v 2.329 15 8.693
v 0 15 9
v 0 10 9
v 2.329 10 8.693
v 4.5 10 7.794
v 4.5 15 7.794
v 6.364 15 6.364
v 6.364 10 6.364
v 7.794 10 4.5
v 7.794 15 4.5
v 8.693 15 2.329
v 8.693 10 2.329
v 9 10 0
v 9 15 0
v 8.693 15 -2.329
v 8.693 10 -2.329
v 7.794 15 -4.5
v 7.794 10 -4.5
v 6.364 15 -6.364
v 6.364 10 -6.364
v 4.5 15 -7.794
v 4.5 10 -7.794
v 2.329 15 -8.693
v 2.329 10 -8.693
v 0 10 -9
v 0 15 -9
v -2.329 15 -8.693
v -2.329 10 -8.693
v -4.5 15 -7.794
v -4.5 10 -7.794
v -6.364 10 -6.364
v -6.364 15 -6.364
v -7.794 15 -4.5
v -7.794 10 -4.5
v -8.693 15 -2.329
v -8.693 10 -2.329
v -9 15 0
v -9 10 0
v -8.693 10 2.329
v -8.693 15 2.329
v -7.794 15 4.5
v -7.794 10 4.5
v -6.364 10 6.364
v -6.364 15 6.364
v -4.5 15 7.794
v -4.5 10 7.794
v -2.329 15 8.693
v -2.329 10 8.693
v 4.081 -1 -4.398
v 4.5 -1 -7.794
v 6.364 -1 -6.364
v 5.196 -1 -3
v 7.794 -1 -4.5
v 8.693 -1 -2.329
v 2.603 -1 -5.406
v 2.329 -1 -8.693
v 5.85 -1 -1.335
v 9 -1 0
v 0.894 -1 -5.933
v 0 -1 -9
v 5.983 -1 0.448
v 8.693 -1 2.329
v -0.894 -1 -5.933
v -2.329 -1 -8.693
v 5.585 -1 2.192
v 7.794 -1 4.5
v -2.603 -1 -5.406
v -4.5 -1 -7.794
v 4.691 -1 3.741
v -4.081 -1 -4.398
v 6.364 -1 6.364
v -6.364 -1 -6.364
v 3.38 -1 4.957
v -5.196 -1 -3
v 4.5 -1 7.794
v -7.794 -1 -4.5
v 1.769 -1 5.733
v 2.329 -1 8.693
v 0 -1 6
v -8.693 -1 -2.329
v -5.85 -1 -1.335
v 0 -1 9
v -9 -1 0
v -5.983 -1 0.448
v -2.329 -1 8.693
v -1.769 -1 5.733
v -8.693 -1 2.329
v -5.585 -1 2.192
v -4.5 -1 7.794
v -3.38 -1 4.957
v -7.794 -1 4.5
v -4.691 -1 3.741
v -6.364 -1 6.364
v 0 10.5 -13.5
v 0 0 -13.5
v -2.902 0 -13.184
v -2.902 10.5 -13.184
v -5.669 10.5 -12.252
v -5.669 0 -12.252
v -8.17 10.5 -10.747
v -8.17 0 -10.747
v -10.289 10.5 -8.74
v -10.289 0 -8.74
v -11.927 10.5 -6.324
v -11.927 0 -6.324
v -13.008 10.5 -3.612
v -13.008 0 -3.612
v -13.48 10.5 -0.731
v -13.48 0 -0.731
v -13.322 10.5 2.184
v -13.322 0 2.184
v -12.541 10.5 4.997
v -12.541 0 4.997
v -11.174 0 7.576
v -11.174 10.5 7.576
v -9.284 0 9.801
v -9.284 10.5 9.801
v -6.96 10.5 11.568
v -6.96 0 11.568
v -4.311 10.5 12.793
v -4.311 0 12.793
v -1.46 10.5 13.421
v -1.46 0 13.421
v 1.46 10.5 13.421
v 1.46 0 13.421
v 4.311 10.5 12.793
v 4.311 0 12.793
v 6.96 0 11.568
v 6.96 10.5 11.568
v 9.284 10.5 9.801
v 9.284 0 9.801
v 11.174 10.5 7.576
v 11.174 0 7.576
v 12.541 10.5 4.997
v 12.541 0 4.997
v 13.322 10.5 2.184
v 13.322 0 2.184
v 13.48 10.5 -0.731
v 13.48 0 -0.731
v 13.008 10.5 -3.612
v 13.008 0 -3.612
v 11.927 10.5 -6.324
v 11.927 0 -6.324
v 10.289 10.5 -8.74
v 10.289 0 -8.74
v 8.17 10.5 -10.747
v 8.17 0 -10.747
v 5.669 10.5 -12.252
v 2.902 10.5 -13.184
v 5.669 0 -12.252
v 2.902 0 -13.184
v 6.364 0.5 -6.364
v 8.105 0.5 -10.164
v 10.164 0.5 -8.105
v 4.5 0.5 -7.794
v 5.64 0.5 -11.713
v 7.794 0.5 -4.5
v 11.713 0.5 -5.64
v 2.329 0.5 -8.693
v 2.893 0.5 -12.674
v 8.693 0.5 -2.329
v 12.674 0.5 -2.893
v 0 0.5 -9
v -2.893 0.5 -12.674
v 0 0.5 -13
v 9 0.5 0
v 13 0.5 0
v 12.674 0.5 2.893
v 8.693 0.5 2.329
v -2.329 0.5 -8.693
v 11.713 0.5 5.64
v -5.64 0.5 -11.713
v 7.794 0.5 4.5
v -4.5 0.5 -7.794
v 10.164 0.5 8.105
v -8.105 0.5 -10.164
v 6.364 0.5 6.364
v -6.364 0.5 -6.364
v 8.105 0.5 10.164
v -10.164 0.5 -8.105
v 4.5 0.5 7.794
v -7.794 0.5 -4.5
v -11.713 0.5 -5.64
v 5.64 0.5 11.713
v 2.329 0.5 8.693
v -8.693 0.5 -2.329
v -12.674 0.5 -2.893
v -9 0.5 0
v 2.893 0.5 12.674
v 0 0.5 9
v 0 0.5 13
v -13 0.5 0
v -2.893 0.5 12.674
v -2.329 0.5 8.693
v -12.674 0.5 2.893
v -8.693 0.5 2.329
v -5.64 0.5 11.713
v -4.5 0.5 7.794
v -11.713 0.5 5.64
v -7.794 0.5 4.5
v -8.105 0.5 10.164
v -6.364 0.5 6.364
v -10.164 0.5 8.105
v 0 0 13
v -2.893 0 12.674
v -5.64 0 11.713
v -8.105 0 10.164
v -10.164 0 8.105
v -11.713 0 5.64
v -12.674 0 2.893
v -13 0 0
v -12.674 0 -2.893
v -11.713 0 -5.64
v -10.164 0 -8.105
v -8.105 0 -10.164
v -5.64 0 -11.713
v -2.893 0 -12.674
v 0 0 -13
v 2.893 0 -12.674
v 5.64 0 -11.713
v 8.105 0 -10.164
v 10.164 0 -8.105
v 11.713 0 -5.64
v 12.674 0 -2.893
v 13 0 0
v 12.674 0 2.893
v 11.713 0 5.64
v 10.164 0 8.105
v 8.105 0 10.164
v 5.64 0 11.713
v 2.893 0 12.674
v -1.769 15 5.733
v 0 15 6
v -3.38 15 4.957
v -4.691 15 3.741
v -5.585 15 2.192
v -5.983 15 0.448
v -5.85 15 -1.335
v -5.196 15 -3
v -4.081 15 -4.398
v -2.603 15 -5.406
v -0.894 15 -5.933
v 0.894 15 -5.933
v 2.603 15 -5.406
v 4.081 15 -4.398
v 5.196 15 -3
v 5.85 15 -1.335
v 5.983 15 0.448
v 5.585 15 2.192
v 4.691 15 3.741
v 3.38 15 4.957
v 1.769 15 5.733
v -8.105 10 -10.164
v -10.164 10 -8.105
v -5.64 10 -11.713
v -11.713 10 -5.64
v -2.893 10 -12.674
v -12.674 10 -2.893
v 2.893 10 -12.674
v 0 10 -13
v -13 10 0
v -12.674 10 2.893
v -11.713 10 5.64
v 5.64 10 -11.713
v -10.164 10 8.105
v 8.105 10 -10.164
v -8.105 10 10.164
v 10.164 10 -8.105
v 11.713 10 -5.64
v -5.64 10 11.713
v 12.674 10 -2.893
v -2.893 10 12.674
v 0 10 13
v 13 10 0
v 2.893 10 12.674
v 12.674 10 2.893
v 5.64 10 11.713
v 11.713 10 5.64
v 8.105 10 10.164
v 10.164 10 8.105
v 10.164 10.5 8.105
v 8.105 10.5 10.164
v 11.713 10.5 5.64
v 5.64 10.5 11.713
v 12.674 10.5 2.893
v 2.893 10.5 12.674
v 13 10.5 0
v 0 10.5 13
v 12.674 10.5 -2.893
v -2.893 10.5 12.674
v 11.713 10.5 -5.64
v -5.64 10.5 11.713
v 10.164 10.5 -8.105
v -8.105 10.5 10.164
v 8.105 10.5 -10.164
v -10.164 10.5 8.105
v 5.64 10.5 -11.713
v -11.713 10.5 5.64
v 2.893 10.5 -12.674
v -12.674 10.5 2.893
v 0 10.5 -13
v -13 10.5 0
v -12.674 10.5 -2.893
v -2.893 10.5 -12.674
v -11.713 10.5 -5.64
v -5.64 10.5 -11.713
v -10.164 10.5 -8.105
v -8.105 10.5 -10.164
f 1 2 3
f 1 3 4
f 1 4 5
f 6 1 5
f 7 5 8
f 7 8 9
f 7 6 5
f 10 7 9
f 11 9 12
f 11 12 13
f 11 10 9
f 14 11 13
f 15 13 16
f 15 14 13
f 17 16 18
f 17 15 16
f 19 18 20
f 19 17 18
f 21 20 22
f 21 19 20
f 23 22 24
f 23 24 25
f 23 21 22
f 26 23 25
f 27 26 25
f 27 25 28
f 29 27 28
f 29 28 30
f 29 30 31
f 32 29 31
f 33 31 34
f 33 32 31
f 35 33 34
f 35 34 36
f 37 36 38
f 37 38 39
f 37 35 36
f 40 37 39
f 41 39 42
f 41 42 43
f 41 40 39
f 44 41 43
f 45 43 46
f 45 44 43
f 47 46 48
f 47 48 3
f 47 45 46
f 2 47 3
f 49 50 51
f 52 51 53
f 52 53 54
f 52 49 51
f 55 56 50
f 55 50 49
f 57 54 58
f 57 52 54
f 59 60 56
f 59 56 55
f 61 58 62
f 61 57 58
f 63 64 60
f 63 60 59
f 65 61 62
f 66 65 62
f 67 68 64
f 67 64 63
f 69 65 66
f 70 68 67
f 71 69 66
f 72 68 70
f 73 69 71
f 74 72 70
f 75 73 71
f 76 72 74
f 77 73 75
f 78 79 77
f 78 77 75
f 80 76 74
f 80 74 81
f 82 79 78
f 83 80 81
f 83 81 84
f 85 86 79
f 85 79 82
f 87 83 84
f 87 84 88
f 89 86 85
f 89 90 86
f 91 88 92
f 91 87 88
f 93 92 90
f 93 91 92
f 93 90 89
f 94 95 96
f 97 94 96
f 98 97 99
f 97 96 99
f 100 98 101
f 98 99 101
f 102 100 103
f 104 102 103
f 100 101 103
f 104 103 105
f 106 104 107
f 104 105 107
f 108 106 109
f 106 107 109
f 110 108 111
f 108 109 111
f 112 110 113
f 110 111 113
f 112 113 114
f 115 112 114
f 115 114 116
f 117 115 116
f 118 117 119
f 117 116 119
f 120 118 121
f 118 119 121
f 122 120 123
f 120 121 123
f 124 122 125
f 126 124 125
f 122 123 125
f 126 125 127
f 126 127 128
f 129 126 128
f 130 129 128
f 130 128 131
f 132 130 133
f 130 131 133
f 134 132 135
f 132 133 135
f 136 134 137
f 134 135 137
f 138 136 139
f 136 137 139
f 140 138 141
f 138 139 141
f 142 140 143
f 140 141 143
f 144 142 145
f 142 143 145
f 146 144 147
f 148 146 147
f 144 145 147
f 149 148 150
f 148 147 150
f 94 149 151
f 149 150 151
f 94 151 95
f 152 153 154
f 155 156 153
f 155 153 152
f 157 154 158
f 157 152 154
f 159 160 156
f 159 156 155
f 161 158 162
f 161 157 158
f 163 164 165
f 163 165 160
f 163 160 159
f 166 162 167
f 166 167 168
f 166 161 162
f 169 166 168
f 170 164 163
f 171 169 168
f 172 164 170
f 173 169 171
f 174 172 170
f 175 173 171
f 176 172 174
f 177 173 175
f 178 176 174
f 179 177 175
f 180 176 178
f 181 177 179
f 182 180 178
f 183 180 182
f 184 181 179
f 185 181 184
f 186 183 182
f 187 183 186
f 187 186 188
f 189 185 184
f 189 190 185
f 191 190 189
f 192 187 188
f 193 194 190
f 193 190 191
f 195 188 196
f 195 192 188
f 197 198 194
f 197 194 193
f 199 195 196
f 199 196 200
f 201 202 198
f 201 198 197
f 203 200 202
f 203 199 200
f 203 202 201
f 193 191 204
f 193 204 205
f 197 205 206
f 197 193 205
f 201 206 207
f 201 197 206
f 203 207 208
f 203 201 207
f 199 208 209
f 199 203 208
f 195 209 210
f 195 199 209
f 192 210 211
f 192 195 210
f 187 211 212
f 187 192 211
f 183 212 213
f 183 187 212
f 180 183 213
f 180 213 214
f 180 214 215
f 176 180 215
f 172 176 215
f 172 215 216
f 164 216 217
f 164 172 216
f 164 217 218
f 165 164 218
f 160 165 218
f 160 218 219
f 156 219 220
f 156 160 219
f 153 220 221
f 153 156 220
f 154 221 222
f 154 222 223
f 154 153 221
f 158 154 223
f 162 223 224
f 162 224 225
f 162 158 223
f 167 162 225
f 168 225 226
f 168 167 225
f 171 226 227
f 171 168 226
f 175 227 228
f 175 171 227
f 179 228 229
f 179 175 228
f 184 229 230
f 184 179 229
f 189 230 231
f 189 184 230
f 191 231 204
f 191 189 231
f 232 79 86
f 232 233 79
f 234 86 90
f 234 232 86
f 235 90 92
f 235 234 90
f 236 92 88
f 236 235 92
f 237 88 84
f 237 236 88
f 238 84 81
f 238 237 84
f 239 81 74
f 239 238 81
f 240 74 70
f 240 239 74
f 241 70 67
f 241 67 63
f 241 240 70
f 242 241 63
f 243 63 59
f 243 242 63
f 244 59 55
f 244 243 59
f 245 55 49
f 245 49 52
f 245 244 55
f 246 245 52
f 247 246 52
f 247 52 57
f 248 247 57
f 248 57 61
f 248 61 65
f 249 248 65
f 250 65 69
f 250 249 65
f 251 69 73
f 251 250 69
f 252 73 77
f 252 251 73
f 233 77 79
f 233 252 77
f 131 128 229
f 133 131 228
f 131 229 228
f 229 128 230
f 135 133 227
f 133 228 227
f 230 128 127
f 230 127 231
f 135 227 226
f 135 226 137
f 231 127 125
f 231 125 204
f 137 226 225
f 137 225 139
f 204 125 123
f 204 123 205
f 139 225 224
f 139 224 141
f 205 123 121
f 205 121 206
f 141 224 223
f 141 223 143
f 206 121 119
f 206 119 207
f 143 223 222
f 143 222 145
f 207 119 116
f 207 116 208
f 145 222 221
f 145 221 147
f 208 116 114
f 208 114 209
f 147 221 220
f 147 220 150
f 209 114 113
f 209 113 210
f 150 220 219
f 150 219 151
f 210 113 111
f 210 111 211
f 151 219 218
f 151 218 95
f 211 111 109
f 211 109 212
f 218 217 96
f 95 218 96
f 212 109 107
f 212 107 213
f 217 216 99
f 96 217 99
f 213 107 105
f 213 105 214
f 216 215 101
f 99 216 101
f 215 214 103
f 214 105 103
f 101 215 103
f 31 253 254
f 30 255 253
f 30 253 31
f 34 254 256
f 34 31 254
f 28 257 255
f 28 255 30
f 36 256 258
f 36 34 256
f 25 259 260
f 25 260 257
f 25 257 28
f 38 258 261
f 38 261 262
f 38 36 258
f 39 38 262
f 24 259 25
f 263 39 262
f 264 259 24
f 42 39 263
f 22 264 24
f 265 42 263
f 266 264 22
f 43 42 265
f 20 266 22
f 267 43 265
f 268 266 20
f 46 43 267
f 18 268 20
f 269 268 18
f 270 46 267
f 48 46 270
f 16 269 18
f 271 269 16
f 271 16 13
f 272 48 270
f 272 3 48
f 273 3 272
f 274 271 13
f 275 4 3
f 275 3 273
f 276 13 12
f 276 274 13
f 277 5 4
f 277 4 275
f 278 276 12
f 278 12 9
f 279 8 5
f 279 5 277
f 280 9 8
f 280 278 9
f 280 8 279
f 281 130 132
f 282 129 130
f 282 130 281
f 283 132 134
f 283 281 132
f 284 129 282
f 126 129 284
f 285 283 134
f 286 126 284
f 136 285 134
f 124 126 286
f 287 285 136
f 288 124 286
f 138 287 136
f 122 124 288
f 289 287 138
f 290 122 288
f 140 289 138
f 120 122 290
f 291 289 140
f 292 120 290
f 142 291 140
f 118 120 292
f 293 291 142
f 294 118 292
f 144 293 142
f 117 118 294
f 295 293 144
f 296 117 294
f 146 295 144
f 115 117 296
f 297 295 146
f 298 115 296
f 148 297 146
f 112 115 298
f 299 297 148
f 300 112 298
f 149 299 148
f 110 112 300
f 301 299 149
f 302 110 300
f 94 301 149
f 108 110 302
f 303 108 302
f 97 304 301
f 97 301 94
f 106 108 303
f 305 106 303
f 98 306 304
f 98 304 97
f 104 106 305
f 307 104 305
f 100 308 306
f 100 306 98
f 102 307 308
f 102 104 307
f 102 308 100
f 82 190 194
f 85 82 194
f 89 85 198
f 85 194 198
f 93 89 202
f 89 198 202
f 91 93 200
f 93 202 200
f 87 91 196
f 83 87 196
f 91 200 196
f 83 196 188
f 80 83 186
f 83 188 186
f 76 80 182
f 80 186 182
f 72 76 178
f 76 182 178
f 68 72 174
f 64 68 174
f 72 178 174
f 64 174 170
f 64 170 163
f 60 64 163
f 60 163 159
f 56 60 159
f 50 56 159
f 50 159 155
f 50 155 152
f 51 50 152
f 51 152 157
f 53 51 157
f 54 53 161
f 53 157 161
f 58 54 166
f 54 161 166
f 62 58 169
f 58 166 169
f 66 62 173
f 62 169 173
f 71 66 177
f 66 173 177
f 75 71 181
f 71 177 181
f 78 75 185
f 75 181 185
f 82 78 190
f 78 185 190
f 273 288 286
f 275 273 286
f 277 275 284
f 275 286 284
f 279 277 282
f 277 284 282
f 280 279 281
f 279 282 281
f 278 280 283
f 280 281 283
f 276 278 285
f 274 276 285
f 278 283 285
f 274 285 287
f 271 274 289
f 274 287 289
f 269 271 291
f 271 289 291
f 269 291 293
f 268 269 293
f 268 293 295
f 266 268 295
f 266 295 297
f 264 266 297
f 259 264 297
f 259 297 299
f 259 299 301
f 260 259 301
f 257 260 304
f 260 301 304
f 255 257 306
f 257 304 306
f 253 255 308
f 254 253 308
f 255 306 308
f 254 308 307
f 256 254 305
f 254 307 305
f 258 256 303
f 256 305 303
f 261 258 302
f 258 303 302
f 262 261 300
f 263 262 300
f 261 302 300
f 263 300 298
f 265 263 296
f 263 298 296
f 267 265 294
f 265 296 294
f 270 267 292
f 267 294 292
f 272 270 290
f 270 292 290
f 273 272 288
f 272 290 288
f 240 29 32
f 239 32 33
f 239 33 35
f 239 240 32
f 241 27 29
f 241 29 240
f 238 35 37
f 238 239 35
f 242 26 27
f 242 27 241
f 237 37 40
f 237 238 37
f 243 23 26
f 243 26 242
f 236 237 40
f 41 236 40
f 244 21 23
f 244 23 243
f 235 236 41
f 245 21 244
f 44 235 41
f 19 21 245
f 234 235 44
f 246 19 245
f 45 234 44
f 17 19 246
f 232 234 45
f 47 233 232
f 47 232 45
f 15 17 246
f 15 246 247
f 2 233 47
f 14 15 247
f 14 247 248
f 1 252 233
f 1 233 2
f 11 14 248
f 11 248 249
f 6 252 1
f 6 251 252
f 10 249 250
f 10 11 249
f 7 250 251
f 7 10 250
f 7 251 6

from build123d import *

# Parameters (mm, degrees)
SKETCH_1_R          = 13.5
EXTRUDE_1_DEPTH     = 10.5
SKETCH_2_R          = 13
CUT_EXTRUDE_1_DEPTH = 0.5
CUT_EXTRUDE_START   = -0.5
SKETCH_3_R          = 13
CUT_EXTRUDE_2_DEPTH = 0.5
SKETCH_4_R          = 6
CUT_EXTRUDE_3_DEPTH = 22.552262062
EXTRUDE_START       = 5
SKETCH_5_R          = 9
SKETCH_5_R_2        = 6
EXTRUDE_2_DEPTH     = 5
SKETCH_6_R          = 9
SKETCH_6_R_2        = 6
EXTRUDE_3_DEPTH     = 1.5


with BuildPart() as part:
    # Эскиз1 → Бобышка-Вытянуть1 (new body)
    with BuildSketch(Plane(origin=(0, 0, 0), x_dir=(1, 0, 0), z_dir=(0, 1, 0))):
        with Locations(Location((0, 0, 0), (0, 0, 90))):
            Circle(SKETCH_1_R)
    extrude(amount=EXTRUDE_1_DEPTH)

    # Эскиз2 → Вырез-Вытянуть1 (cut)
    with BuildSketch(Plane(origin=(0, 10.5, 0), x_dir=(1, 0, 0), z_dir=(0, 1, 0))):
        with Locations(Location((0, 0, 0), (0, 0, 270))):
            Circle(SKETCH_2_R)
    extrude(amount=-CUT_EXTRUDE_1_DEPTH, mode=Mode.SUBTRACT)

    # Эскиз3 → Вырез-Вытянуть2 (cut)
    with BuildSketch(Plane.XZ.offset(CUT_EXTRUDE_START)):
        with Locations(Location((0, 0, 0), (0, 0, 90))):
            Circle(SKETCH_3_R)
    extrude(amount=CUT_EXTRUDE_2_DEPTH, mode=Mode.SUBTRACT)

    # Эскиз4 → Вырез-Вытянуть3 (cut, through all)
    with BuildSketch(Plane(origin=(0, 10, 0), x_dir=(1, 0, 0), z_dir=(0, 1, 0))):
        with Locations(Location((0, 0, 0), (0, 0, 270))):
            Circle(SKETCH_4_R)
    extrude(amount=-CUT_EXTRUDE_3_DEPTH, mode=Mode.SUBTRACT)

    # Эскиз5 → Бобышка-Вытянуть2 (add)
    with BuildSketch(Plane(origin=(0, 10, 0), x_dir=(1, 0, 0), z_dir=(0, 1, 0)).offset(EXTRUDE_START)):
        with Locations(Location((0, 0, 0), (0, 0, 270))):
            Circle(SKETCH_5_R)
        with Locations(Location((0, 0, 0), (0, 0, 270))):
            Circle(SKETCH_5_R_2, mode=Mode.SUBTRACT)
    extrude(amount=-EXTRUDE_2_DEPTH)

    # Эскиз6 → Бобышка-Вытянуть3 (add)
    with BuildSketch(Plane.XZ.offset(-0.5)):
        with Locations(Location((0, 0, 0), (0, 0, 90))):
            Circle(SKETCH_6_R)
        with Locations(Location((0, 0, 0), (0, 0, 90))):
            Circle(SKETCH_6_R_2, mode=Mode.SUBTRACT)
    extrude(amount=EXTRUDE_3_DEPTH)


solid = part.part
